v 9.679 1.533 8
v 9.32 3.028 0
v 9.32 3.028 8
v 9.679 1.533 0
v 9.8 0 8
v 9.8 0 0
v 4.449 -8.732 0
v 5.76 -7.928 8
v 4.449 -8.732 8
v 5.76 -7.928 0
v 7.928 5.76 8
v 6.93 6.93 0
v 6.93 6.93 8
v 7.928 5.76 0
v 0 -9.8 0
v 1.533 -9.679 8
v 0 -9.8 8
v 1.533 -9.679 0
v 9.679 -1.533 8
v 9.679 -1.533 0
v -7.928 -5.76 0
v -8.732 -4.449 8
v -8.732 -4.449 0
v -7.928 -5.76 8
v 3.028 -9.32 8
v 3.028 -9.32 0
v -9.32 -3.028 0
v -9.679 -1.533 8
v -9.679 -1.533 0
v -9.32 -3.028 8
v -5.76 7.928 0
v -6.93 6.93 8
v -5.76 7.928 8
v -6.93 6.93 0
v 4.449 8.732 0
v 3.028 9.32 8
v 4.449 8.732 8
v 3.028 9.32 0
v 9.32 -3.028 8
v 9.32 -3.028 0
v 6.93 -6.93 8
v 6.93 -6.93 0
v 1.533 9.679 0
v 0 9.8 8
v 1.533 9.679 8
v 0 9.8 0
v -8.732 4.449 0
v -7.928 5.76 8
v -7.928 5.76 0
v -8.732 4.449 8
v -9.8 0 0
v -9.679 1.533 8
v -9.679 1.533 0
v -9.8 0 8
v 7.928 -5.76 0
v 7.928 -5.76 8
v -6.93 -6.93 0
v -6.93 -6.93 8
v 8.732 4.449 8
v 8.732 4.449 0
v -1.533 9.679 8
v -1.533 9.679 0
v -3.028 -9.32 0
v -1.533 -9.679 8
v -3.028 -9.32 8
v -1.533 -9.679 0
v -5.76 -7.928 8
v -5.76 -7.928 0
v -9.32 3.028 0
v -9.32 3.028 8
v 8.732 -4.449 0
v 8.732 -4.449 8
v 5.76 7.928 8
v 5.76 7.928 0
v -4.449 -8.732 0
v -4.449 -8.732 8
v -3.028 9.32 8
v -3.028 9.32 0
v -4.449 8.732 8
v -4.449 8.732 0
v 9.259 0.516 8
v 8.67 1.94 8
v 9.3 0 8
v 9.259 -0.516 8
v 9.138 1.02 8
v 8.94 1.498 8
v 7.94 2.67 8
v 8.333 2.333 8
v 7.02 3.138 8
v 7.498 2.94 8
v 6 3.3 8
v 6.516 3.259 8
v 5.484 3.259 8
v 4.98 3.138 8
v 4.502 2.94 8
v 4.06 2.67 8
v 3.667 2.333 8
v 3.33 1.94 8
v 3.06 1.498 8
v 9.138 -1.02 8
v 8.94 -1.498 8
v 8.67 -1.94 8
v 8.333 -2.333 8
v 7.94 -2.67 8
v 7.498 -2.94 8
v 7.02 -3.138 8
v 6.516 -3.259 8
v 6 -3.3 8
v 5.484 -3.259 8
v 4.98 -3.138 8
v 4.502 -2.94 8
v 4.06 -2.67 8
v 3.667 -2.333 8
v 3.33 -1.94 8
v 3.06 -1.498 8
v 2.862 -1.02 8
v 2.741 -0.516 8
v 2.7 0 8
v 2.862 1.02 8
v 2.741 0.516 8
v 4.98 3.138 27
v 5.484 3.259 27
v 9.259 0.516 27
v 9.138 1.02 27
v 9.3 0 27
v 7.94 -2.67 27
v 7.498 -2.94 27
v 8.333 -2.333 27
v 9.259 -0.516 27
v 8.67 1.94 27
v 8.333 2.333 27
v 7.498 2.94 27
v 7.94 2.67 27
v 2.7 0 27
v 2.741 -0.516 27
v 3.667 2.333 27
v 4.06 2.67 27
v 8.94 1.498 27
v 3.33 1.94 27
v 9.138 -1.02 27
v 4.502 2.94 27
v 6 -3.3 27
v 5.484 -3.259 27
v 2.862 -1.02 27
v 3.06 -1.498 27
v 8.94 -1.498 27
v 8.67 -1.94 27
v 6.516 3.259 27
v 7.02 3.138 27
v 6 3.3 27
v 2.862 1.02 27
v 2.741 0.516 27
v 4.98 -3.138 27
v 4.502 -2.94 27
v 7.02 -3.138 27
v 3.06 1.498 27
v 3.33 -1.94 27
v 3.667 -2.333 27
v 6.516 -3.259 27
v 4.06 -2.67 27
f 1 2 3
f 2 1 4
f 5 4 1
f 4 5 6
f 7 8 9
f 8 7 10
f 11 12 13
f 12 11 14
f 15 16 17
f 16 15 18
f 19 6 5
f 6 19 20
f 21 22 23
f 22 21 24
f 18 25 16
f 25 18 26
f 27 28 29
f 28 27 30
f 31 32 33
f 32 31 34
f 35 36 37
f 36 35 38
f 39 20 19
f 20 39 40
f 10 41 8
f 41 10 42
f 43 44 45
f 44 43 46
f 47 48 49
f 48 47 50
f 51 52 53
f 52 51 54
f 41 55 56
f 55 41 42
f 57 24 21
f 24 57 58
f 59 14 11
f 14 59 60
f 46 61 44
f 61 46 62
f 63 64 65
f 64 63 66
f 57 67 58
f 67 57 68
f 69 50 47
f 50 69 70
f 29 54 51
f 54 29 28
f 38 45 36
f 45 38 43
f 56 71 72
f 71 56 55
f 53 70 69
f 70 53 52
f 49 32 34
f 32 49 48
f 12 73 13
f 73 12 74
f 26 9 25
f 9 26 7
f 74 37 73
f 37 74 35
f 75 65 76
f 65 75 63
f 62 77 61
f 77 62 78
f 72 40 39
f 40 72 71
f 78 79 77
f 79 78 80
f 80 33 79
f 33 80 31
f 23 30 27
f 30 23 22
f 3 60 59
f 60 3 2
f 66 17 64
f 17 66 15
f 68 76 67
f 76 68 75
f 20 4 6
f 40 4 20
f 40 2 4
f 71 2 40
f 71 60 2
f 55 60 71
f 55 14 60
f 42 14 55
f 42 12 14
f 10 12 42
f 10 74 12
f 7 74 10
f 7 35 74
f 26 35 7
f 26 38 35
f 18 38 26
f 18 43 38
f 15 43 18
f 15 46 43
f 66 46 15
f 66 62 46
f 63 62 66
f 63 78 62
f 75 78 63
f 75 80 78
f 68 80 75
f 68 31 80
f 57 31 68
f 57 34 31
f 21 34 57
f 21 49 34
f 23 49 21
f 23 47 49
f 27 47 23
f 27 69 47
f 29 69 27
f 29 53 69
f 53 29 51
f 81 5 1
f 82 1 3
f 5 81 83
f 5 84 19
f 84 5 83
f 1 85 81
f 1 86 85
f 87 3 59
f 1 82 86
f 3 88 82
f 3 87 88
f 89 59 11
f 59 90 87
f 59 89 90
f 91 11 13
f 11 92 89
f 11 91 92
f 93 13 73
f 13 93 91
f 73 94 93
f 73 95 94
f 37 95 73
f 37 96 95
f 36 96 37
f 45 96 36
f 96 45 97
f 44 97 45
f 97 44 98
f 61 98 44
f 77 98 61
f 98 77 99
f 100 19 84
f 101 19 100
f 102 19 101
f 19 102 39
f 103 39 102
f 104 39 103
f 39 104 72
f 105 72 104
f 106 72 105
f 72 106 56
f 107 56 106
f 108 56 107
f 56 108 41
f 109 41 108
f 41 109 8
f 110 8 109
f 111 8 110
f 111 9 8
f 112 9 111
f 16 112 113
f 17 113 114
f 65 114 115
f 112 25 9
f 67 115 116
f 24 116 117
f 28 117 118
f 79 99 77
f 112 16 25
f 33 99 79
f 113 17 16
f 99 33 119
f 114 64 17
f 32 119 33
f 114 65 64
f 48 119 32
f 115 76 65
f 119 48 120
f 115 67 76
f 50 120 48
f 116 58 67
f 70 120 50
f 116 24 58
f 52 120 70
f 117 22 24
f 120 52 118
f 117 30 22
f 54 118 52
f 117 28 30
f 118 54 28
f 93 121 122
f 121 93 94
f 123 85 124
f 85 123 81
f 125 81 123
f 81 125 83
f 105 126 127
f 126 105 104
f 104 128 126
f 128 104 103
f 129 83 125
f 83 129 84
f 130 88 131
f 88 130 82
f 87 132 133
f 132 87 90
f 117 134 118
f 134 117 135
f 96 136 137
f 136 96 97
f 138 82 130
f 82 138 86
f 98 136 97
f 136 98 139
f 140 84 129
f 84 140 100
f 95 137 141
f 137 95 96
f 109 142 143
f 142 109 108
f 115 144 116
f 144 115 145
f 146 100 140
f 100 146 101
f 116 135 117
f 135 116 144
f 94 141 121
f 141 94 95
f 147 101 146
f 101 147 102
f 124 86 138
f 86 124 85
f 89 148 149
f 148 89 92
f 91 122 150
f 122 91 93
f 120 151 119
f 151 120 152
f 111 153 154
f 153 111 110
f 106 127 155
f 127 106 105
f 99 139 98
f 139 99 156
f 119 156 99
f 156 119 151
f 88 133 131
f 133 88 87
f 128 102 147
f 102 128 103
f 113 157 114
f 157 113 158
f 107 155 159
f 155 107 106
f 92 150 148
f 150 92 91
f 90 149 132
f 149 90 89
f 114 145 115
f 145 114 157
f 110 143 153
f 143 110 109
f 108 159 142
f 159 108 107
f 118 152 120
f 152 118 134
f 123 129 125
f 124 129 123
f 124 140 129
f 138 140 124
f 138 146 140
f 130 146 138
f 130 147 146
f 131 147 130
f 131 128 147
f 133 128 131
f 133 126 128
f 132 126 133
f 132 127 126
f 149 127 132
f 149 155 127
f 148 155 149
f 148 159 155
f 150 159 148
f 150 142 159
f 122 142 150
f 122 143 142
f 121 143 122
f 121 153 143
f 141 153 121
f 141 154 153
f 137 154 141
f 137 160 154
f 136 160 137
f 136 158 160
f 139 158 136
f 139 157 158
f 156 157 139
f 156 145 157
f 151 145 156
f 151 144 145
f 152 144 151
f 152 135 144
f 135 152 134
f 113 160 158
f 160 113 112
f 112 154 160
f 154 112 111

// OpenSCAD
radius1 = 9.8;
radius2 = 3.3;
height1 = 8;
height2 = 19;
trans_small_cyl_location = 6;

//--------------------------------------
module piedica_senzor_atingere()
{
  union(){
    color("red") cylinder(r = radius1, h = height1, $fn=40);
    translate([trans_small_cyl_location, 0, height1]) color("yellow") cylinder(r = radius2, h = height2, $fn = 40);
  }
}

piedica_senzor_atingere();
